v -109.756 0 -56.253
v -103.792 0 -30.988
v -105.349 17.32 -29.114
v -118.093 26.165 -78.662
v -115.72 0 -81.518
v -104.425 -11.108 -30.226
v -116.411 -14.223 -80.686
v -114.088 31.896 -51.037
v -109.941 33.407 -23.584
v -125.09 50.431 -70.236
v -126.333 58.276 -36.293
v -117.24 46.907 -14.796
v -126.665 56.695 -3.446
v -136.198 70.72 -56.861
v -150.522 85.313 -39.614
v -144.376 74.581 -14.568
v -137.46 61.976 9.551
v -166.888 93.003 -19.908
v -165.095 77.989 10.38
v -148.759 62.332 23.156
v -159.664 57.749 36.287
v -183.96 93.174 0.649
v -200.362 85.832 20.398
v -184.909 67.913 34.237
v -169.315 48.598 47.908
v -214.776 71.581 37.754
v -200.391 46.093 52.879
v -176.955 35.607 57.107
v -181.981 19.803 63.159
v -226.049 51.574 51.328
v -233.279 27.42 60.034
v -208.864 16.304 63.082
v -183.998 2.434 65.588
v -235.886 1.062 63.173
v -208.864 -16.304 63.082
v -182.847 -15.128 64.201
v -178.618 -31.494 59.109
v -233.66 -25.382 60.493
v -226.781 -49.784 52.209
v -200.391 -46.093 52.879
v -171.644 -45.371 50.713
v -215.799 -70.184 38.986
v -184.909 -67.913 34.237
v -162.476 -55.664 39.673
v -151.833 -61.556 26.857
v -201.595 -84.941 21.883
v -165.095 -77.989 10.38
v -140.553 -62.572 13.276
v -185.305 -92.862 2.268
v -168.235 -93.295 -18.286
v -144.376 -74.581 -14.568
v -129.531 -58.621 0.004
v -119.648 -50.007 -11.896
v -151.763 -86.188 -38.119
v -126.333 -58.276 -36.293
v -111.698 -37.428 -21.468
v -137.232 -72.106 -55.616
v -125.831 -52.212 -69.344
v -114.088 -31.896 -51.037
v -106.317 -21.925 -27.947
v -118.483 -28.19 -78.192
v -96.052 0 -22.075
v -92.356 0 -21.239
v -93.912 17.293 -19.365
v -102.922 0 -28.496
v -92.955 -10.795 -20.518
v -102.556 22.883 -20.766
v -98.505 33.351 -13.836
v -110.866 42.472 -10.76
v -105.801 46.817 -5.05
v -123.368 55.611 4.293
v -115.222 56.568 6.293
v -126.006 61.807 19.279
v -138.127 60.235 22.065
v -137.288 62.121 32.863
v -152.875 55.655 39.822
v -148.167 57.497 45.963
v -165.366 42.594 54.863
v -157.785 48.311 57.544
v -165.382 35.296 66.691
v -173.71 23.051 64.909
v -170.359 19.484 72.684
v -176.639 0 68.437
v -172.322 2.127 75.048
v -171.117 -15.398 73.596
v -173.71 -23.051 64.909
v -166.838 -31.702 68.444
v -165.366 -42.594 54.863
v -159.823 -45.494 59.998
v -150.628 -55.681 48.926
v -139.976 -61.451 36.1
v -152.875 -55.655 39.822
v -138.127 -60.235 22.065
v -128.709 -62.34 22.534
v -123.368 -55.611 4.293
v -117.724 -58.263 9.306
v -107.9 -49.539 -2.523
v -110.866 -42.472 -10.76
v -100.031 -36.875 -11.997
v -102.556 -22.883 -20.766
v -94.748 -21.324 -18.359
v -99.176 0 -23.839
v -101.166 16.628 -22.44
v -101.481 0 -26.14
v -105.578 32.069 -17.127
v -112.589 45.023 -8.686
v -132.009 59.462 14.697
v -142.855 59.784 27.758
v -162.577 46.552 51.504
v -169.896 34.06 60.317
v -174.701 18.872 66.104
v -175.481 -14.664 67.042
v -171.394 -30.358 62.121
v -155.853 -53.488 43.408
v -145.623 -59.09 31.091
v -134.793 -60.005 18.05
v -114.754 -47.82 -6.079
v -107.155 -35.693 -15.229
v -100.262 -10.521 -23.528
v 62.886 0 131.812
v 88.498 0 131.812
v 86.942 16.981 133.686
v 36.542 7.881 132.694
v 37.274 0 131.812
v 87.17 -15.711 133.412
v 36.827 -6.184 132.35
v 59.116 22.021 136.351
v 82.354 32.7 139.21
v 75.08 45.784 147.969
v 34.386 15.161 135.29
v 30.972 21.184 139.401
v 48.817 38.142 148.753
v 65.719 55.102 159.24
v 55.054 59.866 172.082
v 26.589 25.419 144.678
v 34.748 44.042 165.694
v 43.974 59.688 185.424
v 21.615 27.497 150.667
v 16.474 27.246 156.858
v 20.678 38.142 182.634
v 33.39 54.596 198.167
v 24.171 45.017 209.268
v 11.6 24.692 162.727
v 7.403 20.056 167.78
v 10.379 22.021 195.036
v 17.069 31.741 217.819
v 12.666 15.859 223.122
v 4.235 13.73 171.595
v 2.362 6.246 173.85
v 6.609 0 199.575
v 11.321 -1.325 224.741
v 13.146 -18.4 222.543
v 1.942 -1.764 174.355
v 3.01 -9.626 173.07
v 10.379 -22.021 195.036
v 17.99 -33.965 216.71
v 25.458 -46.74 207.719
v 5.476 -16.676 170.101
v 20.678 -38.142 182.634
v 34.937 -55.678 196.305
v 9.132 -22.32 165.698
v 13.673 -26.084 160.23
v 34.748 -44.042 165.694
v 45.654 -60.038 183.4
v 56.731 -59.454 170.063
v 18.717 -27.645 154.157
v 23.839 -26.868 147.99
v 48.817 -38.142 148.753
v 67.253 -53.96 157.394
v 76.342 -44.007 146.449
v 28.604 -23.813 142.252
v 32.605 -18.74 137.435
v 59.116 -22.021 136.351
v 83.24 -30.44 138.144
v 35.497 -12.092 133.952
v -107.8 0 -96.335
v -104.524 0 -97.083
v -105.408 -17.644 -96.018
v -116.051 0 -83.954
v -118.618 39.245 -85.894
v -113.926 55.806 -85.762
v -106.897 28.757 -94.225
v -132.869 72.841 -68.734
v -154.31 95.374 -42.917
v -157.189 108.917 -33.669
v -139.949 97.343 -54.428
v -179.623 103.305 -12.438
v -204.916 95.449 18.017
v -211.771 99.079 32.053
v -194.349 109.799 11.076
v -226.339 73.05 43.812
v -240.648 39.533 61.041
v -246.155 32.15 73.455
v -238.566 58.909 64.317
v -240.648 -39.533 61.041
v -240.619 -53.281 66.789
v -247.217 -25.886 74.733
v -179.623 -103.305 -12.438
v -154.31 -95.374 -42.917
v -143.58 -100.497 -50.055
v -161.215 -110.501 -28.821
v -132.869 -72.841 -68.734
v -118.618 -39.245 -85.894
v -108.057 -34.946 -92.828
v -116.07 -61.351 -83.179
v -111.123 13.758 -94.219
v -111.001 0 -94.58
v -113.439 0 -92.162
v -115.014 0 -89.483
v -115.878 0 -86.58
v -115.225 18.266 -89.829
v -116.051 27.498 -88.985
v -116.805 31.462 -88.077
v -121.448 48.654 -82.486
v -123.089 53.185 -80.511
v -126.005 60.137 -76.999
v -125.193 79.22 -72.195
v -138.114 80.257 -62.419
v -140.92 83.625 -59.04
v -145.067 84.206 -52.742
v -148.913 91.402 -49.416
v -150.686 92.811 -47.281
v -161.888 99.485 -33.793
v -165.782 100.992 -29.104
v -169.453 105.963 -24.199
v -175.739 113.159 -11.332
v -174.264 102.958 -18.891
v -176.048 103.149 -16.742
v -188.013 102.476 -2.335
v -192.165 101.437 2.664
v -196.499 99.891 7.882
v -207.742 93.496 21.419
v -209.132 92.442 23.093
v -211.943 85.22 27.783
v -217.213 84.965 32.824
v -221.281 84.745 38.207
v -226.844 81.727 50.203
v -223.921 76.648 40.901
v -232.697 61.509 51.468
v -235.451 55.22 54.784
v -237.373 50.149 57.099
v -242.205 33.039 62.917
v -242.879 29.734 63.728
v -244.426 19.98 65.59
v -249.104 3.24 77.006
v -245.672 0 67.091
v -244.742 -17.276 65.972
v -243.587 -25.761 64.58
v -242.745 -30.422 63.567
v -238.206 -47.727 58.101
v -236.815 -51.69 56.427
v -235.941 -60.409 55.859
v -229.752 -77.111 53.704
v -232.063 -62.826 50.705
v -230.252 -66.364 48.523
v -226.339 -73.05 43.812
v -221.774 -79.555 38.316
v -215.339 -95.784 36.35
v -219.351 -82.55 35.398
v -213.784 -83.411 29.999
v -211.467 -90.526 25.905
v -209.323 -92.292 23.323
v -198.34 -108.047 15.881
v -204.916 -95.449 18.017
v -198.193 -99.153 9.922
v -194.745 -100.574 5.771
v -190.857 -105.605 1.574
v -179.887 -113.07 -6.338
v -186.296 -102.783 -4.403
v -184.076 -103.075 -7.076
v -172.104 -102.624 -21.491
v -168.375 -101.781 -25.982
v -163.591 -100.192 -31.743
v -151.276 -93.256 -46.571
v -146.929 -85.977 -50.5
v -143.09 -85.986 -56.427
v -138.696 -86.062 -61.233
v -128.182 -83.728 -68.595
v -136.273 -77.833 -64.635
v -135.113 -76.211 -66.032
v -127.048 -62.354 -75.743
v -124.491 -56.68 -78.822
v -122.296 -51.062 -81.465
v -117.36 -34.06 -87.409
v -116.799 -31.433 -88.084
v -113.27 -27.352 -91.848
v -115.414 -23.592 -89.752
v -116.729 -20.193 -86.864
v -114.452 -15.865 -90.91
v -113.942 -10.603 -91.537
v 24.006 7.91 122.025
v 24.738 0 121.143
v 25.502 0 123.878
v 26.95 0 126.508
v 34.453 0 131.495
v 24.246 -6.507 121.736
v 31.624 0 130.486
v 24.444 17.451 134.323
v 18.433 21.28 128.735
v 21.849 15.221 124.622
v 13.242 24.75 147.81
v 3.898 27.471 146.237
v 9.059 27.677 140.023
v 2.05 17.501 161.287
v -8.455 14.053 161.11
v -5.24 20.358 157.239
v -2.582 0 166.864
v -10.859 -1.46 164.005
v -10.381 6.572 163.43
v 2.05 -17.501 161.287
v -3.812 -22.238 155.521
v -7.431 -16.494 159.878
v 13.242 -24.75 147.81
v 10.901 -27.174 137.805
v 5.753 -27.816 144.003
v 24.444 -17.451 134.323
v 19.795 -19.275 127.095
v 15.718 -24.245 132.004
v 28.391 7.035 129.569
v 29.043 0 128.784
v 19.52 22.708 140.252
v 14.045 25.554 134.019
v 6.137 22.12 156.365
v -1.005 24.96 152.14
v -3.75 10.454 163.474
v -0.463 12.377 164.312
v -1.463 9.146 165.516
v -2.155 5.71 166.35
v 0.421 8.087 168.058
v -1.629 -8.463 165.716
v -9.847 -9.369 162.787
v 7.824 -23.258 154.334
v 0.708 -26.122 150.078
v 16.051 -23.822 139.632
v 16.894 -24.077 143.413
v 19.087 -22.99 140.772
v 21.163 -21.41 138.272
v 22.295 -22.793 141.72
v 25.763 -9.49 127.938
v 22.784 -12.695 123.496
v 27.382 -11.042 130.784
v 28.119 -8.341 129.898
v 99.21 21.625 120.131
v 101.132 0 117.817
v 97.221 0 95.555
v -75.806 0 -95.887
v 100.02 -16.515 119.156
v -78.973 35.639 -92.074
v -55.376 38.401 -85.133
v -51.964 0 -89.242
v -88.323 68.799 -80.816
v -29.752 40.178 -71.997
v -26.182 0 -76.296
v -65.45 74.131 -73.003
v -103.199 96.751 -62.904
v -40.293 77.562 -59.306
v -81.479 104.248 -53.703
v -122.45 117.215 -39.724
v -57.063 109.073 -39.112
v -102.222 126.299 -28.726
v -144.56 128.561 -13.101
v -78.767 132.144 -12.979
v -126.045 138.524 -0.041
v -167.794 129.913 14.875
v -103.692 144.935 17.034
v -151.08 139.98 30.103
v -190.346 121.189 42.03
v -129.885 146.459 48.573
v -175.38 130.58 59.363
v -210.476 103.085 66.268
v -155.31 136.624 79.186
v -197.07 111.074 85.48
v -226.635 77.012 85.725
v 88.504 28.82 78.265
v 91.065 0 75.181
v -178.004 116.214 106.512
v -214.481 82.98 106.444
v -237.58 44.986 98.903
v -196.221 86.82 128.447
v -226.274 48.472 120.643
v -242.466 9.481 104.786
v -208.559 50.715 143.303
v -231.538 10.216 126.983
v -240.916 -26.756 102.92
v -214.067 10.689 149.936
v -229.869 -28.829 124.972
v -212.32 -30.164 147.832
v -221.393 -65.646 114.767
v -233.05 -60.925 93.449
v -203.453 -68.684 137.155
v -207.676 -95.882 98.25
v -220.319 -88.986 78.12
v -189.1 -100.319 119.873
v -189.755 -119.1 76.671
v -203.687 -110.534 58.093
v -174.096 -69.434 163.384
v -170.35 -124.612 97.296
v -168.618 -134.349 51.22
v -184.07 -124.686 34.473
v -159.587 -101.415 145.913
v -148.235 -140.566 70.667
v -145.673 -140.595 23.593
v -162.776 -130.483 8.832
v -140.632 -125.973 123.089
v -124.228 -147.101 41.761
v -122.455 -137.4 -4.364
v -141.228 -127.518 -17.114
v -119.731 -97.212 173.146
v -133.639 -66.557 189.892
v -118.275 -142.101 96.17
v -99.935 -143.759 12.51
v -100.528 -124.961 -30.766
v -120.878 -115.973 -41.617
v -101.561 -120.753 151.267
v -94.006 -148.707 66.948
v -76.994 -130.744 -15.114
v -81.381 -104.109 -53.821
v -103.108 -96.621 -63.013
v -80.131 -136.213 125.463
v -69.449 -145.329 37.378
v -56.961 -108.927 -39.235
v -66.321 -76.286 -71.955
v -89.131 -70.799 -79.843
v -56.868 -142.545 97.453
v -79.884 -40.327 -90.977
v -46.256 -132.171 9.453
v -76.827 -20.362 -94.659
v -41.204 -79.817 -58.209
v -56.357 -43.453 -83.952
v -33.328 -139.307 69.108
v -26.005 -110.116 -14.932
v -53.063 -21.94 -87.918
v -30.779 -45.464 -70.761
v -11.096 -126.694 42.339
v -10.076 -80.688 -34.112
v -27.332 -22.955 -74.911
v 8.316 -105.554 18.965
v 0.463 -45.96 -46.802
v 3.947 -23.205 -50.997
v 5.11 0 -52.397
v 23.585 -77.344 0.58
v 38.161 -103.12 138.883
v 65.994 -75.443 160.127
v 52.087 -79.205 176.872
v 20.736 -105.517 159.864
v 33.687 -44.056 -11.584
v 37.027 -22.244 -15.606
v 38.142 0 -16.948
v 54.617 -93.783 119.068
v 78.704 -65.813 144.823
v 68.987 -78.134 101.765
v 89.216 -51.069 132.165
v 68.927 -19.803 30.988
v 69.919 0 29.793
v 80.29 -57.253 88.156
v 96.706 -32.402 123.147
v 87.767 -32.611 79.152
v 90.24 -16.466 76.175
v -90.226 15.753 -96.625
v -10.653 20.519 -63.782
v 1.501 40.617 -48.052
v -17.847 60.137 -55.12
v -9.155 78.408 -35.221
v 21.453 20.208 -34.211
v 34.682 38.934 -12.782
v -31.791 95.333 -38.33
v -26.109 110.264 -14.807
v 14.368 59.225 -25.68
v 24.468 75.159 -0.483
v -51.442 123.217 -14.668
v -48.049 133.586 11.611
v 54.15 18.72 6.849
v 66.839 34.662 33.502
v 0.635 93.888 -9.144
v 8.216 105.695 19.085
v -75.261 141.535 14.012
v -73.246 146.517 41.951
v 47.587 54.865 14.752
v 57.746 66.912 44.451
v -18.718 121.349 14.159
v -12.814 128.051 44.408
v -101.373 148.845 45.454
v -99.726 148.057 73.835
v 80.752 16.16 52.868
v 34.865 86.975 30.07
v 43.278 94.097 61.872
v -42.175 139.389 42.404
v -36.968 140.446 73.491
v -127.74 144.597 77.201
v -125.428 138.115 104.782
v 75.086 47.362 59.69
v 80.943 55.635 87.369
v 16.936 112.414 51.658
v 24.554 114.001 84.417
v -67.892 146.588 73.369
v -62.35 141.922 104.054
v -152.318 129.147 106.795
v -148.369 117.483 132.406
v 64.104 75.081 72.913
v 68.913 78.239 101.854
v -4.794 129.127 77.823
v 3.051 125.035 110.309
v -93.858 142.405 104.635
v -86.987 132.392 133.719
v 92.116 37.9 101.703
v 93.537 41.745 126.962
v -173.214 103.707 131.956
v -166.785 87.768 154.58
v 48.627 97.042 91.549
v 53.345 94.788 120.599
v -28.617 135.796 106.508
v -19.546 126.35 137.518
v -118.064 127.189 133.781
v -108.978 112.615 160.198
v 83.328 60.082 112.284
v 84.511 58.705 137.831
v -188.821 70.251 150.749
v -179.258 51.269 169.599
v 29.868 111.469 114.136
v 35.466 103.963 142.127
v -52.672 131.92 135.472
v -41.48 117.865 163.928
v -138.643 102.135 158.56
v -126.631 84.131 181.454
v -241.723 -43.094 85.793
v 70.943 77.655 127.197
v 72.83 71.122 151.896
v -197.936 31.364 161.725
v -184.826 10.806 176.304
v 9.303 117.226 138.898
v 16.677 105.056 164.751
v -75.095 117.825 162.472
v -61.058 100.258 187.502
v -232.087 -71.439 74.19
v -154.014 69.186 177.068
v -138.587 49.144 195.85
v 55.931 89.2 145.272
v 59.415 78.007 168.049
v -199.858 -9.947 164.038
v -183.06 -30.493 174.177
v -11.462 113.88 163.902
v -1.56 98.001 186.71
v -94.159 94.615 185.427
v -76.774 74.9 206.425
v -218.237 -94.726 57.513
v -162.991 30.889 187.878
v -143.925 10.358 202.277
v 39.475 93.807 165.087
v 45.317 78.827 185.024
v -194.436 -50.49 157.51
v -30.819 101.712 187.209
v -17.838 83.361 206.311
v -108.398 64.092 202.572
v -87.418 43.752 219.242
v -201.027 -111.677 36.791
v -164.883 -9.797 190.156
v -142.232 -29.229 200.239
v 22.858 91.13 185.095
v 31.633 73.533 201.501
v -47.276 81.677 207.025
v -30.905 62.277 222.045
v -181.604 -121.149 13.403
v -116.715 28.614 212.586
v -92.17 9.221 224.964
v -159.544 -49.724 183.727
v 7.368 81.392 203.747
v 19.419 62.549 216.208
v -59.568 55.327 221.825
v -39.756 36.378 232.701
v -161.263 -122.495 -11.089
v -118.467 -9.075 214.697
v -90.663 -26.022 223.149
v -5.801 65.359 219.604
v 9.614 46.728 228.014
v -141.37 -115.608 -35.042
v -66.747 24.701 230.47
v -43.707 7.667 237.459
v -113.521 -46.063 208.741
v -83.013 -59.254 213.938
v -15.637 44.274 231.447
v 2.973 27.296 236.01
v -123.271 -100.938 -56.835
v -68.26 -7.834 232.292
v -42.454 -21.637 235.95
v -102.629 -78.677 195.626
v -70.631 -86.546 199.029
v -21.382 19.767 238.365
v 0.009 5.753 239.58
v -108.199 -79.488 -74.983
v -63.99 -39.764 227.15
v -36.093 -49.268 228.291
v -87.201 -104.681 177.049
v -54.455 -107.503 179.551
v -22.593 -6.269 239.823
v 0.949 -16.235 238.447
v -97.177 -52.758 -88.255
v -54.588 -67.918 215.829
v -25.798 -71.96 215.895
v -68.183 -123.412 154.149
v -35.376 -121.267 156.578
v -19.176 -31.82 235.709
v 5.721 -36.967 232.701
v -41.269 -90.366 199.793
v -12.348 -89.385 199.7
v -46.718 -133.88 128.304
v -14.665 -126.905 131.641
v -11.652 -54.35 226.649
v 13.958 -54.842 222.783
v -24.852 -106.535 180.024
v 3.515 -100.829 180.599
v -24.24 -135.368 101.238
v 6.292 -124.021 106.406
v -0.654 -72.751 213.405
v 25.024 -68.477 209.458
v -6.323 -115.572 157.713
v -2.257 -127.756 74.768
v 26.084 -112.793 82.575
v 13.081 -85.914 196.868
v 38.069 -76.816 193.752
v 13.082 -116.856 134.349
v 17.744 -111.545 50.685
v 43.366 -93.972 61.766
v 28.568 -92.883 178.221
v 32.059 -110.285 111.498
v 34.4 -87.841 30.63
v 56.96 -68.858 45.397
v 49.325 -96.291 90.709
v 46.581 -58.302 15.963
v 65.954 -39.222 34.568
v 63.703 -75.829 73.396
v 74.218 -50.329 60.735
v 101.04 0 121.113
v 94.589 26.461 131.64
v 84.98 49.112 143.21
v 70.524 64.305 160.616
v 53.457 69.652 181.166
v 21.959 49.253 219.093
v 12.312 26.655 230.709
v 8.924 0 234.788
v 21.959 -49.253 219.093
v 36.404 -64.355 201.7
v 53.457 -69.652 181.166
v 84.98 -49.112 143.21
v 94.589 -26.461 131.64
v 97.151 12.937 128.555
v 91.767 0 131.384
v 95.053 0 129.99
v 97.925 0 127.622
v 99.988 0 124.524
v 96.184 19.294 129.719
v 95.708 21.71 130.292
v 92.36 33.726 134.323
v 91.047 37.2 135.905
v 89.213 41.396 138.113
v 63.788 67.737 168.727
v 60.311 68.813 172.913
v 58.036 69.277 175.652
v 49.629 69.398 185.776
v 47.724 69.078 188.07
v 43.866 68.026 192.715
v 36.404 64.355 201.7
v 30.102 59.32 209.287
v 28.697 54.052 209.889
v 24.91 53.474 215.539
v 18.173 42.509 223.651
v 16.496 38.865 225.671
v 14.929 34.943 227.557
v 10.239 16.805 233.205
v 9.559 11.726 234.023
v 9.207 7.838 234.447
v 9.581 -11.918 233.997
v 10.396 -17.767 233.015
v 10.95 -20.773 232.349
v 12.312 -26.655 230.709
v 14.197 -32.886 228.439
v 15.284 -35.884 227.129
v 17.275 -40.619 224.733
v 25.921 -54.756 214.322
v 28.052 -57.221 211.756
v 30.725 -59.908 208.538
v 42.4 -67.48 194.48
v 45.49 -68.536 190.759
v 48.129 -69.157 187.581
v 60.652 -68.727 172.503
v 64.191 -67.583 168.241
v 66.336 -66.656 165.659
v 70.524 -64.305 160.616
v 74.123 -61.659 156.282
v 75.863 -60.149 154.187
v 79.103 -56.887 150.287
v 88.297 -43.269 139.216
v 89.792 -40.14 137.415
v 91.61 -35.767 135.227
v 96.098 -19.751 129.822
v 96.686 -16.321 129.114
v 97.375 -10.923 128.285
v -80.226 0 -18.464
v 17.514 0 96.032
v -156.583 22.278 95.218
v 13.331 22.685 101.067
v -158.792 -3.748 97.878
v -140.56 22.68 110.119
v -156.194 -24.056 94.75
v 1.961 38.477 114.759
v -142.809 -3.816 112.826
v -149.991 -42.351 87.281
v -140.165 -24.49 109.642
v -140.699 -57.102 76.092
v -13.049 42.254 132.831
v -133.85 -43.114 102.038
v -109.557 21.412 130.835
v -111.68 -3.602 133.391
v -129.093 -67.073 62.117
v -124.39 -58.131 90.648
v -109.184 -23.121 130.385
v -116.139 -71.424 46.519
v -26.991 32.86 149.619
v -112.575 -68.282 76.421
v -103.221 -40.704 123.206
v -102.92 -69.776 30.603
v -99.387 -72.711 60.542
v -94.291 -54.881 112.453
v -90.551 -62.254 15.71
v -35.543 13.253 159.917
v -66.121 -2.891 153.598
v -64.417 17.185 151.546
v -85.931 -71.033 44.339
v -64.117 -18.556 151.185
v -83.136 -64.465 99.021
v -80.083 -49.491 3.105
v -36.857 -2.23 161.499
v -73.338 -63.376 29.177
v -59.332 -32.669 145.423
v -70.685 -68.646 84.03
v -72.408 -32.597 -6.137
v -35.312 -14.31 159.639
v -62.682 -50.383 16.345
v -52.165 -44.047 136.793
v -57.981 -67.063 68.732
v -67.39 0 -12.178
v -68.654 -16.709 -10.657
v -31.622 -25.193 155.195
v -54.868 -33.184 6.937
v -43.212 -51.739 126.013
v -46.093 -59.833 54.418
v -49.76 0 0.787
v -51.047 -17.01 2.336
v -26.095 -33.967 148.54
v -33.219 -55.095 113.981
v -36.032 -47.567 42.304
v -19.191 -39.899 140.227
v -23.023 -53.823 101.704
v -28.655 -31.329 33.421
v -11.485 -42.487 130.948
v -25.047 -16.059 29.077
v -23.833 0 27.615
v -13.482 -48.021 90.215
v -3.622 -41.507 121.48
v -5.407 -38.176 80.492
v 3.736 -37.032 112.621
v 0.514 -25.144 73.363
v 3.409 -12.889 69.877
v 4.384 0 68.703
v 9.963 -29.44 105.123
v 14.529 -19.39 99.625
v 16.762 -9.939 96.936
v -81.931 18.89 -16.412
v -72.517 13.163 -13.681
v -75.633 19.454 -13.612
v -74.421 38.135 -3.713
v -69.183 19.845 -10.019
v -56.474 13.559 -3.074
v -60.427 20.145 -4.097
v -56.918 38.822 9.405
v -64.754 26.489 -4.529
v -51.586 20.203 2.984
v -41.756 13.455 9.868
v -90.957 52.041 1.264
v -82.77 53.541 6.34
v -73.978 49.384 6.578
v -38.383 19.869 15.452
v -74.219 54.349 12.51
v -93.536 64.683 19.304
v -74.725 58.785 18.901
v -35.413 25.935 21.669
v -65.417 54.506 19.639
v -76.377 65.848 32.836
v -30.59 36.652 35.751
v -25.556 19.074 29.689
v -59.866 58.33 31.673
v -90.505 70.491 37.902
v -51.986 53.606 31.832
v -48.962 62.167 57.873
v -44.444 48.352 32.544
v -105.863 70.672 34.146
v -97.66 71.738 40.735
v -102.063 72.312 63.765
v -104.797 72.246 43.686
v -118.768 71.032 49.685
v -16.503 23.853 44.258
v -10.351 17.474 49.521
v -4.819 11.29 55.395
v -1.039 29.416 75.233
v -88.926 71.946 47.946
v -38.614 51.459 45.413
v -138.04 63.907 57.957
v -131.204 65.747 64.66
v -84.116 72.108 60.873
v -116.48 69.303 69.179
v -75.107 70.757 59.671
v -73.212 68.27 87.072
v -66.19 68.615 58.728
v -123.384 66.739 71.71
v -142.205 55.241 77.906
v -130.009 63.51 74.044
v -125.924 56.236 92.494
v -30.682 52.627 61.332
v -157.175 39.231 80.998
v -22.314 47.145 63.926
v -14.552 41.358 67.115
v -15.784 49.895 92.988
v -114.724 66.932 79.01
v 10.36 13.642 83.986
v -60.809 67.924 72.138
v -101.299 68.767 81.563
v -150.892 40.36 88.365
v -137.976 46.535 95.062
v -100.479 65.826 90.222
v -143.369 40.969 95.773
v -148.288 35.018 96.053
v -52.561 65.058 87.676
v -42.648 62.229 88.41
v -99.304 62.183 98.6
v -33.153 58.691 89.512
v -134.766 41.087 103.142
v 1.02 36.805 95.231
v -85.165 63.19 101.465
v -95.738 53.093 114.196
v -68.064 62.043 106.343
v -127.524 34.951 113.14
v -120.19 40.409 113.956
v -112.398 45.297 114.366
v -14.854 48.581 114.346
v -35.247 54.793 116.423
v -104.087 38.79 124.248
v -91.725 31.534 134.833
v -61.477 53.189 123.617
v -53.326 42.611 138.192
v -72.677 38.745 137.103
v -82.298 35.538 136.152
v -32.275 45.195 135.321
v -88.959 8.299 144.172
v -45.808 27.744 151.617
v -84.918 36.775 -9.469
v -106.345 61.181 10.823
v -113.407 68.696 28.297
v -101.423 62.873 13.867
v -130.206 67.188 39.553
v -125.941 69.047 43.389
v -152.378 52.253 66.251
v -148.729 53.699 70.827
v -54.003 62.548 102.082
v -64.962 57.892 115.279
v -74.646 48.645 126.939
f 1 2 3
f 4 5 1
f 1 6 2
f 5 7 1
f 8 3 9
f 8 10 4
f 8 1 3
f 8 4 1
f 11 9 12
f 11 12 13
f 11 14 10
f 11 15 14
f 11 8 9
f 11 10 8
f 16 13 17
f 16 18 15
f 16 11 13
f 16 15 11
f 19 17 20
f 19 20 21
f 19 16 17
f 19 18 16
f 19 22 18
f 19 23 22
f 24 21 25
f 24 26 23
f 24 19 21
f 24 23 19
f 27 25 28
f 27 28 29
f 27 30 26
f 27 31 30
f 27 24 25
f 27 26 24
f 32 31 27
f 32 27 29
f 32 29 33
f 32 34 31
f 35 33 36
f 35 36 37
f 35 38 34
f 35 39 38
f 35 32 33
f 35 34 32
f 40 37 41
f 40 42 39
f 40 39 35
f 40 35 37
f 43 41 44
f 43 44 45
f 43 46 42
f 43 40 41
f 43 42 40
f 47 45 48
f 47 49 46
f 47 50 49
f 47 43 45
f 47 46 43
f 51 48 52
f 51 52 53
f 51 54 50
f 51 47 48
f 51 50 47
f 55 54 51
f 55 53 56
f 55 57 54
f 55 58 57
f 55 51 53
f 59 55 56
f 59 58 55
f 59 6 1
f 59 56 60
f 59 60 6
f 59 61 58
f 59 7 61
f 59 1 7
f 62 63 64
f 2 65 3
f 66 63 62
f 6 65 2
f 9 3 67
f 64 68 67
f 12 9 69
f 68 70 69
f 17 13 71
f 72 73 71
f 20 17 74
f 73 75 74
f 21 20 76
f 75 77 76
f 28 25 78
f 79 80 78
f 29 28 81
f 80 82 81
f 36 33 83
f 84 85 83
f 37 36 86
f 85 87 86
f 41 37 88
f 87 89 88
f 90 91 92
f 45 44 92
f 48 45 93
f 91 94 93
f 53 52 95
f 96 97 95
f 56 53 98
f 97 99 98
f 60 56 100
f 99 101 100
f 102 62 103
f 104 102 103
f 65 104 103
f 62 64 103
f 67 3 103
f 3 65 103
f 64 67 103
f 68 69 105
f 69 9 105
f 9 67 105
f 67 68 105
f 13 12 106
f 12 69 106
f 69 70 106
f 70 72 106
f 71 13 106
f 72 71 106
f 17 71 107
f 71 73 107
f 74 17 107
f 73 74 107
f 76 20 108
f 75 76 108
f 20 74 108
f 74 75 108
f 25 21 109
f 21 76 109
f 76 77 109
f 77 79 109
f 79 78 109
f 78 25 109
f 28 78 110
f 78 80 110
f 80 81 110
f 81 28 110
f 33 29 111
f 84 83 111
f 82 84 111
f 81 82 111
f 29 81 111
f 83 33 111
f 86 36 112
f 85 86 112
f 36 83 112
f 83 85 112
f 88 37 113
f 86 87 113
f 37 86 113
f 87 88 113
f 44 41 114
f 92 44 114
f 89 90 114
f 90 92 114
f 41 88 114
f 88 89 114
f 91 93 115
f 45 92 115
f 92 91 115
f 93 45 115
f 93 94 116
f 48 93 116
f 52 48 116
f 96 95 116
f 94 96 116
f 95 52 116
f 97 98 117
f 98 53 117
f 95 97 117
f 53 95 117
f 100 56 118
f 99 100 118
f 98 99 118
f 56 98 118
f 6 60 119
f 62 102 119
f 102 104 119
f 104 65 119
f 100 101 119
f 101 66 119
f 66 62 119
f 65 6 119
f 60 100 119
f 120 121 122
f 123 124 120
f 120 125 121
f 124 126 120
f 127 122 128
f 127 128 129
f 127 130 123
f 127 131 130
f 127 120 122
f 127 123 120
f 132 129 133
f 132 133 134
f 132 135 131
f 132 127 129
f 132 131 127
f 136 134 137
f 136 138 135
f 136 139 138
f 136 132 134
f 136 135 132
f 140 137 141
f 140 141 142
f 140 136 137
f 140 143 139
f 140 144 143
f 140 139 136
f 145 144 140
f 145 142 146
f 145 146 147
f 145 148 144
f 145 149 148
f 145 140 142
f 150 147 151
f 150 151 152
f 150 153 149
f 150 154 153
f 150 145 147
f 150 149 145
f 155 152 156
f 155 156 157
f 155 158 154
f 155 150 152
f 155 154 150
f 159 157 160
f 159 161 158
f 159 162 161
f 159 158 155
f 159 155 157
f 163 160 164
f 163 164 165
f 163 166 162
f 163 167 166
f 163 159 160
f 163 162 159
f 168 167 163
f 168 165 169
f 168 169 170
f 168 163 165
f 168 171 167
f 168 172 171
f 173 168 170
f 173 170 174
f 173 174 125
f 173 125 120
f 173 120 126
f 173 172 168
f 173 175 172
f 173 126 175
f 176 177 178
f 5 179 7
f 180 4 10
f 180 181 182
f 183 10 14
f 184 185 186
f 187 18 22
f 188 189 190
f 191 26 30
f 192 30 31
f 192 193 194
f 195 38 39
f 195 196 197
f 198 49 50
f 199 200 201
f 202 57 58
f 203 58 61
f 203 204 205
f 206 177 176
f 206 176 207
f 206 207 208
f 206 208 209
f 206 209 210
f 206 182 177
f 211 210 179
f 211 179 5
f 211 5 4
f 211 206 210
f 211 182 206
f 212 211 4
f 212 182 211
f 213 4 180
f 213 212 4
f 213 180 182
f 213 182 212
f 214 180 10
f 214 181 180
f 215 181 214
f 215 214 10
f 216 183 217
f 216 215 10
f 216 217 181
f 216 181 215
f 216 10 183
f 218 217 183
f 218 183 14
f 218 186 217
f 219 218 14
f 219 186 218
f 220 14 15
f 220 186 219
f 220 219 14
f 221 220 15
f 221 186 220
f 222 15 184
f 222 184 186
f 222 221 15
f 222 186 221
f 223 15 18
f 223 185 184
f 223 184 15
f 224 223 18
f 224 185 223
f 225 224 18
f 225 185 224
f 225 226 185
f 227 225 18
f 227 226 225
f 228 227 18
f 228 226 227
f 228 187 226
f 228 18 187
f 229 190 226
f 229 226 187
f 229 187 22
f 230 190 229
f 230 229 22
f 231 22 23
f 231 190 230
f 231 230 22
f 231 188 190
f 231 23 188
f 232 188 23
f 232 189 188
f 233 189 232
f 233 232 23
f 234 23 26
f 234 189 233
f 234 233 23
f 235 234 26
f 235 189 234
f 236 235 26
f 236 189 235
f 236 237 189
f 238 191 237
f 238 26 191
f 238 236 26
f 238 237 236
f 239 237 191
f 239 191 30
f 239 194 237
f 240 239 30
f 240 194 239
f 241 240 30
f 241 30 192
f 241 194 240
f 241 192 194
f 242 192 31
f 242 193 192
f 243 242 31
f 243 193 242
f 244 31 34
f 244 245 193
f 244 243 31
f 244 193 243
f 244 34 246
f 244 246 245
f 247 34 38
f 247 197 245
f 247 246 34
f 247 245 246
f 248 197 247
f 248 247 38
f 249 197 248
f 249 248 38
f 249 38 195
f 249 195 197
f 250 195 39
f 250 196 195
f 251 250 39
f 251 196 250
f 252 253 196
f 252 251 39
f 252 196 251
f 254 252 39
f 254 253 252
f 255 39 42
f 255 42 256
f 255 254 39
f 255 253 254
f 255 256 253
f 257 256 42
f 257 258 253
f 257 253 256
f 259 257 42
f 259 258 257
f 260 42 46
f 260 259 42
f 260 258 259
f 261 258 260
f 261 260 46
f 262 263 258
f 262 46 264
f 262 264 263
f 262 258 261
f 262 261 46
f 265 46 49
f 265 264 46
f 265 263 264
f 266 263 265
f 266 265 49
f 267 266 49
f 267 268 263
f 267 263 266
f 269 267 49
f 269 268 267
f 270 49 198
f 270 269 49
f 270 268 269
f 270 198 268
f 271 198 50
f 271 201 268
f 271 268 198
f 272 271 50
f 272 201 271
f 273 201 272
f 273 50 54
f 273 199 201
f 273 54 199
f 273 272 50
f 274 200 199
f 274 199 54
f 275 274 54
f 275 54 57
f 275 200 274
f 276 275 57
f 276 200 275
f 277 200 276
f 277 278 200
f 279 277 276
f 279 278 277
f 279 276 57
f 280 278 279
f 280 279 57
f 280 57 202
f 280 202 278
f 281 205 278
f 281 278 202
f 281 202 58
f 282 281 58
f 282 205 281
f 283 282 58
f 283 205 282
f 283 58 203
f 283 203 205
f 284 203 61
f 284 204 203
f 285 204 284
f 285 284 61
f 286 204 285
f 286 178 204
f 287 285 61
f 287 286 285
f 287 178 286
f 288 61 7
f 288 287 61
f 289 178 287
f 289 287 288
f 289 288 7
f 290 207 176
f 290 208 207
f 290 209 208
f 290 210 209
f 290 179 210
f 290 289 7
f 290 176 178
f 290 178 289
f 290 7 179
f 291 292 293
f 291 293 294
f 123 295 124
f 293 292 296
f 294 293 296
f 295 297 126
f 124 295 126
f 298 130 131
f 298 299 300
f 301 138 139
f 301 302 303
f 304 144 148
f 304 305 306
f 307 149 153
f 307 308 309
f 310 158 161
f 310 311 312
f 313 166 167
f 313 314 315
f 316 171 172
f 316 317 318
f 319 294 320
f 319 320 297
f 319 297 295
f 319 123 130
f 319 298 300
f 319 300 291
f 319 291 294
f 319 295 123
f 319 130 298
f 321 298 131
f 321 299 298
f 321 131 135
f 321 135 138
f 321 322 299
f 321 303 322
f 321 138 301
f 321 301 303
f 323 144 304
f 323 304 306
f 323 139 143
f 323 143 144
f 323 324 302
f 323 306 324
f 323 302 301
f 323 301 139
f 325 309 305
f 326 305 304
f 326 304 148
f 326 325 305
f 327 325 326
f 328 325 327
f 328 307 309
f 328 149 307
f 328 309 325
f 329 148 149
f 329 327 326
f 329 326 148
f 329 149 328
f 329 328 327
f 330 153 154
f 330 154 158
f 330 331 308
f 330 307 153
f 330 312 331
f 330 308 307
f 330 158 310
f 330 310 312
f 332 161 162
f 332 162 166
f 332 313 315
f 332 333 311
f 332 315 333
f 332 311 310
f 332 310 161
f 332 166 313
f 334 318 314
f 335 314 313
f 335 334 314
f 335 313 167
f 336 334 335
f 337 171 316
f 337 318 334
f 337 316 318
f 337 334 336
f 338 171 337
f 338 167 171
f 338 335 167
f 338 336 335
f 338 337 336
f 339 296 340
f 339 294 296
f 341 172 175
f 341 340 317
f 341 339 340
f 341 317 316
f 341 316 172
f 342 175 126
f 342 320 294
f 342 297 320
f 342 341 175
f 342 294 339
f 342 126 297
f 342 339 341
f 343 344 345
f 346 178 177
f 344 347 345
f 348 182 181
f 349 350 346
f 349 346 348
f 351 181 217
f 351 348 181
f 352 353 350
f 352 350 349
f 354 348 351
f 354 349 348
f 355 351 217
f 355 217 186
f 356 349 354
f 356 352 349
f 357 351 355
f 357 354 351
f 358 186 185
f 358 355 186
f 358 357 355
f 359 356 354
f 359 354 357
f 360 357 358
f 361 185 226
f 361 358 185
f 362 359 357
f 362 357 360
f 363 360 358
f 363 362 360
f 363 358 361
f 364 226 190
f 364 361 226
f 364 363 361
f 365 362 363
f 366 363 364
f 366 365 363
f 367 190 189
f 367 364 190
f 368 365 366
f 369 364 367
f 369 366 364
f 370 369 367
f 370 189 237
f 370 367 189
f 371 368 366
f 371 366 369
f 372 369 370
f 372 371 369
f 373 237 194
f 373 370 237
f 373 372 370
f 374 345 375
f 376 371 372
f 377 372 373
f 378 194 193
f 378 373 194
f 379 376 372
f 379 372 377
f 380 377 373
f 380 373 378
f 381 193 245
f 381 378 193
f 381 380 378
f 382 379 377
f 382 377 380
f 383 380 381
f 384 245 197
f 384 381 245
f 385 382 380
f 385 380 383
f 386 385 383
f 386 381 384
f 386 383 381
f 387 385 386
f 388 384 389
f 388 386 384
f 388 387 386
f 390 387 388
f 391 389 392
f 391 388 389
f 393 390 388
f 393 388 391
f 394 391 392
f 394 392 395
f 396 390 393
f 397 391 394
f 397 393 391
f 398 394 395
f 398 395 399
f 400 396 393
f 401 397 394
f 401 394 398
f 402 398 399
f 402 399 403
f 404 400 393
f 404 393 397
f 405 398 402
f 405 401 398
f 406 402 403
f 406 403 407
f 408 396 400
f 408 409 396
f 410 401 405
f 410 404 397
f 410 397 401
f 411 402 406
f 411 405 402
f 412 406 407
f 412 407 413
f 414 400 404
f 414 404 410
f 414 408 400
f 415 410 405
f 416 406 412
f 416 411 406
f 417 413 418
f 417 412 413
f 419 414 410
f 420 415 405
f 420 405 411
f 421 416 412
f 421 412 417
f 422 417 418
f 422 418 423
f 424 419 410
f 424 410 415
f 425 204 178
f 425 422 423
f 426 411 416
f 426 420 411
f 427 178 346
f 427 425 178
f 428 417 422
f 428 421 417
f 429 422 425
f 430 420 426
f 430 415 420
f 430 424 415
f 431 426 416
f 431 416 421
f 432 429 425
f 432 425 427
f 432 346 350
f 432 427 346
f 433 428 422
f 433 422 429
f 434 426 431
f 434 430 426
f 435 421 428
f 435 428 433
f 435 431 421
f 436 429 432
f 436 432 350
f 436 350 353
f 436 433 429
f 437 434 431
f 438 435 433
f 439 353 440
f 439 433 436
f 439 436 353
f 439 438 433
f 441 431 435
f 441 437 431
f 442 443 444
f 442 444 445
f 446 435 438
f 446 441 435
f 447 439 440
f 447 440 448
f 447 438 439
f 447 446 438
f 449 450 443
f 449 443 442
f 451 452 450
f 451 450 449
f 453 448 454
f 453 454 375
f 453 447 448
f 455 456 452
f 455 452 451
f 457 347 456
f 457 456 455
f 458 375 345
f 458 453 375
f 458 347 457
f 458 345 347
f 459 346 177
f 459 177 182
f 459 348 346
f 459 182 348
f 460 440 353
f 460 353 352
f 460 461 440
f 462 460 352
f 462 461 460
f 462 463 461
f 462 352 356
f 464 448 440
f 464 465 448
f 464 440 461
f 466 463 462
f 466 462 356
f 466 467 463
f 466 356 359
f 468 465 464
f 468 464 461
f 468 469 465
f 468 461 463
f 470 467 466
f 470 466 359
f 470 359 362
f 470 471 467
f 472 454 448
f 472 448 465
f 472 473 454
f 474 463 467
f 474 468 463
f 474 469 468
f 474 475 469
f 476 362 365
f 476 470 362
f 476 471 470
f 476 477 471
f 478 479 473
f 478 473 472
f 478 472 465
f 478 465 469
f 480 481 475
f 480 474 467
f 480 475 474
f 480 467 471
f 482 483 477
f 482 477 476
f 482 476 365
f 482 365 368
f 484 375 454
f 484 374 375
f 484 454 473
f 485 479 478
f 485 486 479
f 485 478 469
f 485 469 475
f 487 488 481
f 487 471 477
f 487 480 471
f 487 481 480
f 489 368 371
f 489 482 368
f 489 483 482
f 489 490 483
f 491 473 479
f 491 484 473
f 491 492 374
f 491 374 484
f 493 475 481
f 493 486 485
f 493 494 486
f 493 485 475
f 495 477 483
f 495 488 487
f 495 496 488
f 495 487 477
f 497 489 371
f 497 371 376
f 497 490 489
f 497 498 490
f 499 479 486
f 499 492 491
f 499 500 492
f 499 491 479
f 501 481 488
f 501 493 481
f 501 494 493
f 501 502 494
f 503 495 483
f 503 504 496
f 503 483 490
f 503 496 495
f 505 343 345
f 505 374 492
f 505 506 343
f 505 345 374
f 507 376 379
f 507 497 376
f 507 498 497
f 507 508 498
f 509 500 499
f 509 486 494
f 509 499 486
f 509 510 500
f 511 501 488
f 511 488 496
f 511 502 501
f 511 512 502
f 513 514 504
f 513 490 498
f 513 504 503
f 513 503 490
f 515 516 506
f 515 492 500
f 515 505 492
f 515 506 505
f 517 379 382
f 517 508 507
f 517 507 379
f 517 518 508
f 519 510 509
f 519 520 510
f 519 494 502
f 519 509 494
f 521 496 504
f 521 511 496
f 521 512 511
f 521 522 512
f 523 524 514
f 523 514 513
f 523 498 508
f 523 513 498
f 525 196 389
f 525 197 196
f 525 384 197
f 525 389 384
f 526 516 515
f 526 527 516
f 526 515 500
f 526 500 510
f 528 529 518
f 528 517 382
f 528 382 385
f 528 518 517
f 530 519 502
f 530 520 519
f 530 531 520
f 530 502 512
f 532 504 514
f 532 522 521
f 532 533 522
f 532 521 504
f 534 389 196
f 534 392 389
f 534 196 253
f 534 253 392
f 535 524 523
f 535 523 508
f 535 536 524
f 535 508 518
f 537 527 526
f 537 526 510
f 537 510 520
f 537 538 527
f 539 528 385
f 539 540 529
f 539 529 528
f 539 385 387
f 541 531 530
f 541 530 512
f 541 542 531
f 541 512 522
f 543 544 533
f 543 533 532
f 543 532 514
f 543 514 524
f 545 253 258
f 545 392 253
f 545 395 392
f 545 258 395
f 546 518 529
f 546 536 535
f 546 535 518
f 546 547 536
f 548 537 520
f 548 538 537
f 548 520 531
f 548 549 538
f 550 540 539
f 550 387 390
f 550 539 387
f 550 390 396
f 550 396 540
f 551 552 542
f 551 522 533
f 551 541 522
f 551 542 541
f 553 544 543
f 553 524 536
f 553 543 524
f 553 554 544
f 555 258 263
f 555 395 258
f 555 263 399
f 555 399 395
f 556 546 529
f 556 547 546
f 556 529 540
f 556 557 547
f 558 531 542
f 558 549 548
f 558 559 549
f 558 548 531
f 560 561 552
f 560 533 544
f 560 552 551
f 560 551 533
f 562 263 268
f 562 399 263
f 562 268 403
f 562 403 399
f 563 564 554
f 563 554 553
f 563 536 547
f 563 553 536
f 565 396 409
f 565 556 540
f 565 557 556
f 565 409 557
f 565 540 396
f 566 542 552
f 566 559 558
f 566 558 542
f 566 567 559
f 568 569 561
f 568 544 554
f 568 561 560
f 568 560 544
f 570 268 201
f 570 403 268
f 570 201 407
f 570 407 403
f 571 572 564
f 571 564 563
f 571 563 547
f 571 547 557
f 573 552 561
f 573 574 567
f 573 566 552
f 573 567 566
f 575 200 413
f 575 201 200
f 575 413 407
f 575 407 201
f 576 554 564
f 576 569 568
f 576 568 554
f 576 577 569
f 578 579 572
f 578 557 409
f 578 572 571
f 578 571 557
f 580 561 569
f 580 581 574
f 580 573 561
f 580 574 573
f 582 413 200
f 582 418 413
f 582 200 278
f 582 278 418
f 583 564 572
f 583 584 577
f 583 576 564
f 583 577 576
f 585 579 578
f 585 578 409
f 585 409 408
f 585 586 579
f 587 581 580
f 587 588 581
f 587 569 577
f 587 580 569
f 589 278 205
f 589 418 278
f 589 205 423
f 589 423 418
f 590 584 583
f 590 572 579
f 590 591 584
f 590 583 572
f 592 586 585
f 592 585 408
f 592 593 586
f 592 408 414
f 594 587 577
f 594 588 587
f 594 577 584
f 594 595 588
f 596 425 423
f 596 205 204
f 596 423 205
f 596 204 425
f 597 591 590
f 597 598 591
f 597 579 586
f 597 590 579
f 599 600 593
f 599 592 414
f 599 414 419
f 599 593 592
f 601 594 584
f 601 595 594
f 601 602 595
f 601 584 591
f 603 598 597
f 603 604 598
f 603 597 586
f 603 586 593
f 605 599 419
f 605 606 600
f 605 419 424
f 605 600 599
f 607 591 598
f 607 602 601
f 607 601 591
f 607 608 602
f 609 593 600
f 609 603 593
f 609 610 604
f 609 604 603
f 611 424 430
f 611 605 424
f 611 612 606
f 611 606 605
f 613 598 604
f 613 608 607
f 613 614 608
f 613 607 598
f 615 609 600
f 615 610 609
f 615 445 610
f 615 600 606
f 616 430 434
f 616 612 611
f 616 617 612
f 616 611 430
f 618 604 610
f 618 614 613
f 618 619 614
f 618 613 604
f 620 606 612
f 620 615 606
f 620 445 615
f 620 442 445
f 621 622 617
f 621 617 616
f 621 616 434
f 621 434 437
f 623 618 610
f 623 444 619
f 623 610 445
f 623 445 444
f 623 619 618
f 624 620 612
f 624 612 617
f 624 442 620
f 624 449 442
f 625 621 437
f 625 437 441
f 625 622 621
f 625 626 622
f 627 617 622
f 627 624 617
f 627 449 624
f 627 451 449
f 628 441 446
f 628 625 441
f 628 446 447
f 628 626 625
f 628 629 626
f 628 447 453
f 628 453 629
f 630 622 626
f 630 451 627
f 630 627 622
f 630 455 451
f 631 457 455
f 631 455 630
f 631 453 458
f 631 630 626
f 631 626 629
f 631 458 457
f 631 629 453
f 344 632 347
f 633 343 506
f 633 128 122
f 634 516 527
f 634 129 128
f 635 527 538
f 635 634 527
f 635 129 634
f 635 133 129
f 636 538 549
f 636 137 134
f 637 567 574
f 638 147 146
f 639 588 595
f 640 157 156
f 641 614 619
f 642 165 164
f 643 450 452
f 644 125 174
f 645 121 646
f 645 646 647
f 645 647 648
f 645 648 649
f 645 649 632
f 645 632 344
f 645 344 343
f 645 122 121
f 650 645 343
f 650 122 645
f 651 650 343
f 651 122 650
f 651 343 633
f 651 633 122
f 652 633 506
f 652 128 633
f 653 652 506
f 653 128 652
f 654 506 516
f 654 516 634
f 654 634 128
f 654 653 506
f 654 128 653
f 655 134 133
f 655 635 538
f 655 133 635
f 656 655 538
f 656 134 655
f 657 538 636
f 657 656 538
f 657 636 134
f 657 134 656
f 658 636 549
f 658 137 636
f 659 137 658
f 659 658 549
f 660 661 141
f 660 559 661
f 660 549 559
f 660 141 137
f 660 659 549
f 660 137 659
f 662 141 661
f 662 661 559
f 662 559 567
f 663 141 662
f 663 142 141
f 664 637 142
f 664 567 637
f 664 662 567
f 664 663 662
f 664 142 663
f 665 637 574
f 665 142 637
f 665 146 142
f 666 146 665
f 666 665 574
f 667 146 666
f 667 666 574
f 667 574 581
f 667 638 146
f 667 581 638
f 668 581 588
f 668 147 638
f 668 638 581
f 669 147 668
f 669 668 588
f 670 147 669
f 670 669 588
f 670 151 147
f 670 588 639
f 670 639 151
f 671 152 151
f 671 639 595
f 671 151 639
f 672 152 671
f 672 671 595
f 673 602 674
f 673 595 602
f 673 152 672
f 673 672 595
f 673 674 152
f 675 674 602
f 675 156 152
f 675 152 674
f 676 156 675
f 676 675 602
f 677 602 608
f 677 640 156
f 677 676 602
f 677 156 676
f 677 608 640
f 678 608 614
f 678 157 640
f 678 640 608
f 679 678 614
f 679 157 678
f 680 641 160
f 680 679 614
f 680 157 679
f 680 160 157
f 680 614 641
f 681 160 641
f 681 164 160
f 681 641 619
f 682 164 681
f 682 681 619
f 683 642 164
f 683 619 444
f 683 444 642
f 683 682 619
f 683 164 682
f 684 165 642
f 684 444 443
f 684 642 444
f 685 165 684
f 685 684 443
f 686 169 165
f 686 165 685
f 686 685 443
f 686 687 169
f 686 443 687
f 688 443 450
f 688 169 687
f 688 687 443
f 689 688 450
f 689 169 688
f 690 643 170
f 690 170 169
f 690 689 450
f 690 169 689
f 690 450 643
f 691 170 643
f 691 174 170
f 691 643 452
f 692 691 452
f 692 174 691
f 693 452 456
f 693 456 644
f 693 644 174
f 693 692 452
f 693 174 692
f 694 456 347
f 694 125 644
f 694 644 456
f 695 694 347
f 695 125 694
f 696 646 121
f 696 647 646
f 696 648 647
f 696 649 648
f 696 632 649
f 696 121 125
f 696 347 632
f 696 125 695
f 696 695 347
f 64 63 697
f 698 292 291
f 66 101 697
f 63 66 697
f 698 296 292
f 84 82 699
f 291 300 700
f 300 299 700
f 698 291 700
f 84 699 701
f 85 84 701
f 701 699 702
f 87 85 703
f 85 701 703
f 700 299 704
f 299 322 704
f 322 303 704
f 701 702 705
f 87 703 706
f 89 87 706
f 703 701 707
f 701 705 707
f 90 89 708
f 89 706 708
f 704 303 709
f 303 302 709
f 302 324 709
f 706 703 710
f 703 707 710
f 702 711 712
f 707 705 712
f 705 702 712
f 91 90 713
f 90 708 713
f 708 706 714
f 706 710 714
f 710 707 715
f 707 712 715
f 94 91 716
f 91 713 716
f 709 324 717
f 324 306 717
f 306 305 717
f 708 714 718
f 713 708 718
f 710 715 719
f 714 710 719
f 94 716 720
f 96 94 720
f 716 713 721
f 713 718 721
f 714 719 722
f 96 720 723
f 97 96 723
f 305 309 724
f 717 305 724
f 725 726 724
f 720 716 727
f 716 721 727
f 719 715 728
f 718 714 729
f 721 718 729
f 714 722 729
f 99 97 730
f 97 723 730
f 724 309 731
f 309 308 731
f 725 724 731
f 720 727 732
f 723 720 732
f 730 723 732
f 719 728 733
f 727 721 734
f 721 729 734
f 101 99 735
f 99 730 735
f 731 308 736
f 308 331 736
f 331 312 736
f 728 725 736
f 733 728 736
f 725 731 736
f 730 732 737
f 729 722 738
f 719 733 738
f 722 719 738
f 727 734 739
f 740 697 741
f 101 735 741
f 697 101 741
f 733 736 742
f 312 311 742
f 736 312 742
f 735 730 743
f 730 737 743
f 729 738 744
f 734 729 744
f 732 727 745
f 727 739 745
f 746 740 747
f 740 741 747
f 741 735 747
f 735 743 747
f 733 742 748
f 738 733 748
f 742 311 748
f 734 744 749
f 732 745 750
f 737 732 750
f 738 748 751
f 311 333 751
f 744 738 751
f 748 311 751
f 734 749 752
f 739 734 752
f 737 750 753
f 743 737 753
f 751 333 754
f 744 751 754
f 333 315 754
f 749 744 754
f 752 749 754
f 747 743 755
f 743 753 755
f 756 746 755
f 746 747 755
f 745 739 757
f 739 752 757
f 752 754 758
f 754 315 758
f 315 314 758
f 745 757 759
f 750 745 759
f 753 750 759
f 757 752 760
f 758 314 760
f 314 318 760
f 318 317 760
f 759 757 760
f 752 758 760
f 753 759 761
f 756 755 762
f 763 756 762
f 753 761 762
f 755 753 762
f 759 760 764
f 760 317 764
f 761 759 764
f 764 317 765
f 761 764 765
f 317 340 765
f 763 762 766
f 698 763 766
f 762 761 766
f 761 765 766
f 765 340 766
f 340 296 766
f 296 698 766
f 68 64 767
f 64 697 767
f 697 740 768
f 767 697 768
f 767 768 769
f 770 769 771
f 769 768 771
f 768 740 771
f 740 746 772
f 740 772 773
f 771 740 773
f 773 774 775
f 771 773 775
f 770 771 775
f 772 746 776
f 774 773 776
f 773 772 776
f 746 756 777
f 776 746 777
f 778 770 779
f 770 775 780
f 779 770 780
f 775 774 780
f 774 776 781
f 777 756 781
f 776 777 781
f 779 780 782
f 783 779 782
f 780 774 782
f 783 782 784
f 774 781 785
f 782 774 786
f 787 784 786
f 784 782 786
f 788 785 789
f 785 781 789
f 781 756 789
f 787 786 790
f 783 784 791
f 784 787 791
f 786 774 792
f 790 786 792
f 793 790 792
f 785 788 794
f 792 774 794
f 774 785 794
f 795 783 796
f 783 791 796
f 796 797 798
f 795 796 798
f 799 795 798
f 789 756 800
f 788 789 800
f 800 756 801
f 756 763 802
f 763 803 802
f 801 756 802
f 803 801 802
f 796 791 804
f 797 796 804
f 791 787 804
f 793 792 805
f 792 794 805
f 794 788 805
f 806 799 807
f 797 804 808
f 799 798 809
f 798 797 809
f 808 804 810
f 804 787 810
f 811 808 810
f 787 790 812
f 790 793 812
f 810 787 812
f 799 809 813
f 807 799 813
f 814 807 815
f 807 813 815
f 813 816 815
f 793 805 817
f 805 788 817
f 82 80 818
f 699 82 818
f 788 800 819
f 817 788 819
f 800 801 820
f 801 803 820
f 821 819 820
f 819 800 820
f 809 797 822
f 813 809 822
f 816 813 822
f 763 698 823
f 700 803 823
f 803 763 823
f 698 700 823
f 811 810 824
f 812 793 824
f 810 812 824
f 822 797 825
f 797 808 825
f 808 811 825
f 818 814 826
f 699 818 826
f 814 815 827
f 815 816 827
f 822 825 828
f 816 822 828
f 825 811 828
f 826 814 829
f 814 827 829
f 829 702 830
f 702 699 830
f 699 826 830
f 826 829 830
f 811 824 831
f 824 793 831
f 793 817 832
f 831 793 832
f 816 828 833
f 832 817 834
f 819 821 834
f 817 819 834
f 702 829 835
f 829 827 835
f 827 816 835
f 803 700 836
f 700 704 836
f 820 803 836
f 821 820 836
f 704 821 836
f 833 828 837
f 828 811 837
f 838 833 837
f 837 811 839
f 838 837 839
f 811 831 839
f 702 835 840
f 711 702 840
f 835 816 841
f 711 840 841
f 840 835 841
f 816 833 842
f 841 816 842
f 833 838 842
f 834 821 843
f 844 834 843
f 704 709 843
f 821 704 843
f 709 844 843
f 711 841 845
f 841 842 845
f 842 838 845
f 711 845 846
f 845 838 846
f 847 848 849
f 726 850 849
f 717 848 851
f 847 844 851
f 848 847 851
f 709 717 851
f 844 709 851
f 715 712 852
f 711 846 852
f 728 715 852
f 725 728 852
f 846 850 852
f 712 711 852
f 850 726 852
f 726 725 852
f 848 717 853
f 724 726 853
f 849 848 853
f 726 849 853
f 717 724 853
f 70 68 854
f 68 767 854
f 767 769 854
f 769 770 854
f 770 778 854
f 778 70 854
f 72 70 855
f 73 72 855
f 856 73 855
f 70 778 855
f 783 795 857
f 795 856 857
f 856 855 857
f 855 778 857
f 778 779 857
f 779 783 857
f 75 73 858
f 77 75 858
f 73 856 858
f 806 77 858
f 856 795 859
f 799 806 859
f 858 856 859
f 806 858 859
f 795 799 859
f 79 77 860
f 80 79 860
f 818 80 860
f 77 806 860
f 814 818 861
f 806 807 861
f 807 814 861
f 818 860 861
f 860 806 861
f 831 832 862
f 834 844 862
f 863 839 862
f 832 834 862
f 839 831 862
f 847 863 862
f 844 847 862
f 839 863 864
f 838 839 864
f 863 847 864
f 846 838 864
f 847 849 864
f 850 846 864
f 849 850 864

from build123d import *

# Parameters (mm, degrees)
F2_R = 12.7


# Not quite as in the source:
# - the dataset's text gives a spline's control points without its knots; the knots are read off the source's solid


with BuildPart() as f1:
    # F0 (on Front) → F1 (revolve)
    with BuildSketch(Plane.XZ):
        with BuildLine():
            add(Edge.make_bspline(
                [(-101.3375095095, -20.5878382494), (-55.6885989604, -31.3633607521), (25.6624904905, 78.1751456829), (25.6624904905, 131.8121617506)],
                knots=[0, 0, 0, 0, 198.380341768, 198.380341768, 198.380341768, 198.380341768], degree=3))
            Line((-101.3375095095, -20.5878382494), (-118.843568713, -94.7496740625))
            add(Edge.make_bspline(
                [(-118.843568713, -94.7496740625), (-116.0665941497, -95.4051848192), (-110.5257544065, -96.4677086889), (-102.3704459239, -97.3610907466), (-94.4611771904, -97.6207116792), (-86.8589683948, -97.3240119803), (-79.5982708953, -96.5506288996), (-70.3884403509, -94.9831314605), (-59.7532470515, -92.1906012776), (-48.2436048503, -87.9256433043), (-37.7728593934, -83.0146660473), (-28.1393493281, -77.6220391827), (-19.1737656331, -71.8451920299), (-10.7436627877, -65.7423860316), (-2.7492840154, -59.349854765), (4.8826869498, -52.6920953283), (14.6444972187, -43.4861585595), (26.1666233679, -31.4017634463), (39.0643071657, -16.0933493701), (51.0723883895, -0.0902528239), (62.1670566032, 16.5032811769), (72.2835752268, 33.6088961345), (79.8216178481, 48.2670302643), (85.2526772661, 60.2737062446), (89.0045449002, 69.4447684498), (92.4079357388, 78.8195768972), (95.425724145, 88.4548766457), (98.0045512843, 98.430804011), (100.0640809873, 108.856607232), (101.4793909888, 119.8740724547), (101.8624904905, 127.7282488634), (101.8624904905, 131.8121617506)],
                knots=[0, 0, 0, 0, 0.015625, 0.03125, 0.046875, 0.0625, 0.078125, 0.09375, 0.125, 0.15625, 0.1875, 0.21875, 0.25, 0.28125, 0.3125, 0.34375, 0.375, 0.4375, 0.5, 0.5625, 0.625, 0.6875, 0.75, 0.78125, 0.8125, 0.84375, 0.875, 0.90625, 0.9375, 0.96875, 1, 1, 1, 1], degree=3))
            Line((101.8624904905, 131.8121617506), (25.6624904905, 131.8121617506))
        make_face()
    revolve(axis=Axis((-88.8671576977, 0, 63.0316156894), (0.7692921059, 0, 0.6388972185)))

    # F2
    f2_edges = [f1.edges().sort_by_distance(p)[0] for p in [
        (-249.470009, 0, 62.536797),
        (-173.354659, 0, 66.127557),
        (-110.090539, 0, -57.668756),
        (-0.226063, 0, 162.984405),
        (13.765834, 0, 237.88879),
        (63.76249, 0, 131.812162),
    ]]
    fillet(f2_edges, radius=F2_R)


solid = f1.part
